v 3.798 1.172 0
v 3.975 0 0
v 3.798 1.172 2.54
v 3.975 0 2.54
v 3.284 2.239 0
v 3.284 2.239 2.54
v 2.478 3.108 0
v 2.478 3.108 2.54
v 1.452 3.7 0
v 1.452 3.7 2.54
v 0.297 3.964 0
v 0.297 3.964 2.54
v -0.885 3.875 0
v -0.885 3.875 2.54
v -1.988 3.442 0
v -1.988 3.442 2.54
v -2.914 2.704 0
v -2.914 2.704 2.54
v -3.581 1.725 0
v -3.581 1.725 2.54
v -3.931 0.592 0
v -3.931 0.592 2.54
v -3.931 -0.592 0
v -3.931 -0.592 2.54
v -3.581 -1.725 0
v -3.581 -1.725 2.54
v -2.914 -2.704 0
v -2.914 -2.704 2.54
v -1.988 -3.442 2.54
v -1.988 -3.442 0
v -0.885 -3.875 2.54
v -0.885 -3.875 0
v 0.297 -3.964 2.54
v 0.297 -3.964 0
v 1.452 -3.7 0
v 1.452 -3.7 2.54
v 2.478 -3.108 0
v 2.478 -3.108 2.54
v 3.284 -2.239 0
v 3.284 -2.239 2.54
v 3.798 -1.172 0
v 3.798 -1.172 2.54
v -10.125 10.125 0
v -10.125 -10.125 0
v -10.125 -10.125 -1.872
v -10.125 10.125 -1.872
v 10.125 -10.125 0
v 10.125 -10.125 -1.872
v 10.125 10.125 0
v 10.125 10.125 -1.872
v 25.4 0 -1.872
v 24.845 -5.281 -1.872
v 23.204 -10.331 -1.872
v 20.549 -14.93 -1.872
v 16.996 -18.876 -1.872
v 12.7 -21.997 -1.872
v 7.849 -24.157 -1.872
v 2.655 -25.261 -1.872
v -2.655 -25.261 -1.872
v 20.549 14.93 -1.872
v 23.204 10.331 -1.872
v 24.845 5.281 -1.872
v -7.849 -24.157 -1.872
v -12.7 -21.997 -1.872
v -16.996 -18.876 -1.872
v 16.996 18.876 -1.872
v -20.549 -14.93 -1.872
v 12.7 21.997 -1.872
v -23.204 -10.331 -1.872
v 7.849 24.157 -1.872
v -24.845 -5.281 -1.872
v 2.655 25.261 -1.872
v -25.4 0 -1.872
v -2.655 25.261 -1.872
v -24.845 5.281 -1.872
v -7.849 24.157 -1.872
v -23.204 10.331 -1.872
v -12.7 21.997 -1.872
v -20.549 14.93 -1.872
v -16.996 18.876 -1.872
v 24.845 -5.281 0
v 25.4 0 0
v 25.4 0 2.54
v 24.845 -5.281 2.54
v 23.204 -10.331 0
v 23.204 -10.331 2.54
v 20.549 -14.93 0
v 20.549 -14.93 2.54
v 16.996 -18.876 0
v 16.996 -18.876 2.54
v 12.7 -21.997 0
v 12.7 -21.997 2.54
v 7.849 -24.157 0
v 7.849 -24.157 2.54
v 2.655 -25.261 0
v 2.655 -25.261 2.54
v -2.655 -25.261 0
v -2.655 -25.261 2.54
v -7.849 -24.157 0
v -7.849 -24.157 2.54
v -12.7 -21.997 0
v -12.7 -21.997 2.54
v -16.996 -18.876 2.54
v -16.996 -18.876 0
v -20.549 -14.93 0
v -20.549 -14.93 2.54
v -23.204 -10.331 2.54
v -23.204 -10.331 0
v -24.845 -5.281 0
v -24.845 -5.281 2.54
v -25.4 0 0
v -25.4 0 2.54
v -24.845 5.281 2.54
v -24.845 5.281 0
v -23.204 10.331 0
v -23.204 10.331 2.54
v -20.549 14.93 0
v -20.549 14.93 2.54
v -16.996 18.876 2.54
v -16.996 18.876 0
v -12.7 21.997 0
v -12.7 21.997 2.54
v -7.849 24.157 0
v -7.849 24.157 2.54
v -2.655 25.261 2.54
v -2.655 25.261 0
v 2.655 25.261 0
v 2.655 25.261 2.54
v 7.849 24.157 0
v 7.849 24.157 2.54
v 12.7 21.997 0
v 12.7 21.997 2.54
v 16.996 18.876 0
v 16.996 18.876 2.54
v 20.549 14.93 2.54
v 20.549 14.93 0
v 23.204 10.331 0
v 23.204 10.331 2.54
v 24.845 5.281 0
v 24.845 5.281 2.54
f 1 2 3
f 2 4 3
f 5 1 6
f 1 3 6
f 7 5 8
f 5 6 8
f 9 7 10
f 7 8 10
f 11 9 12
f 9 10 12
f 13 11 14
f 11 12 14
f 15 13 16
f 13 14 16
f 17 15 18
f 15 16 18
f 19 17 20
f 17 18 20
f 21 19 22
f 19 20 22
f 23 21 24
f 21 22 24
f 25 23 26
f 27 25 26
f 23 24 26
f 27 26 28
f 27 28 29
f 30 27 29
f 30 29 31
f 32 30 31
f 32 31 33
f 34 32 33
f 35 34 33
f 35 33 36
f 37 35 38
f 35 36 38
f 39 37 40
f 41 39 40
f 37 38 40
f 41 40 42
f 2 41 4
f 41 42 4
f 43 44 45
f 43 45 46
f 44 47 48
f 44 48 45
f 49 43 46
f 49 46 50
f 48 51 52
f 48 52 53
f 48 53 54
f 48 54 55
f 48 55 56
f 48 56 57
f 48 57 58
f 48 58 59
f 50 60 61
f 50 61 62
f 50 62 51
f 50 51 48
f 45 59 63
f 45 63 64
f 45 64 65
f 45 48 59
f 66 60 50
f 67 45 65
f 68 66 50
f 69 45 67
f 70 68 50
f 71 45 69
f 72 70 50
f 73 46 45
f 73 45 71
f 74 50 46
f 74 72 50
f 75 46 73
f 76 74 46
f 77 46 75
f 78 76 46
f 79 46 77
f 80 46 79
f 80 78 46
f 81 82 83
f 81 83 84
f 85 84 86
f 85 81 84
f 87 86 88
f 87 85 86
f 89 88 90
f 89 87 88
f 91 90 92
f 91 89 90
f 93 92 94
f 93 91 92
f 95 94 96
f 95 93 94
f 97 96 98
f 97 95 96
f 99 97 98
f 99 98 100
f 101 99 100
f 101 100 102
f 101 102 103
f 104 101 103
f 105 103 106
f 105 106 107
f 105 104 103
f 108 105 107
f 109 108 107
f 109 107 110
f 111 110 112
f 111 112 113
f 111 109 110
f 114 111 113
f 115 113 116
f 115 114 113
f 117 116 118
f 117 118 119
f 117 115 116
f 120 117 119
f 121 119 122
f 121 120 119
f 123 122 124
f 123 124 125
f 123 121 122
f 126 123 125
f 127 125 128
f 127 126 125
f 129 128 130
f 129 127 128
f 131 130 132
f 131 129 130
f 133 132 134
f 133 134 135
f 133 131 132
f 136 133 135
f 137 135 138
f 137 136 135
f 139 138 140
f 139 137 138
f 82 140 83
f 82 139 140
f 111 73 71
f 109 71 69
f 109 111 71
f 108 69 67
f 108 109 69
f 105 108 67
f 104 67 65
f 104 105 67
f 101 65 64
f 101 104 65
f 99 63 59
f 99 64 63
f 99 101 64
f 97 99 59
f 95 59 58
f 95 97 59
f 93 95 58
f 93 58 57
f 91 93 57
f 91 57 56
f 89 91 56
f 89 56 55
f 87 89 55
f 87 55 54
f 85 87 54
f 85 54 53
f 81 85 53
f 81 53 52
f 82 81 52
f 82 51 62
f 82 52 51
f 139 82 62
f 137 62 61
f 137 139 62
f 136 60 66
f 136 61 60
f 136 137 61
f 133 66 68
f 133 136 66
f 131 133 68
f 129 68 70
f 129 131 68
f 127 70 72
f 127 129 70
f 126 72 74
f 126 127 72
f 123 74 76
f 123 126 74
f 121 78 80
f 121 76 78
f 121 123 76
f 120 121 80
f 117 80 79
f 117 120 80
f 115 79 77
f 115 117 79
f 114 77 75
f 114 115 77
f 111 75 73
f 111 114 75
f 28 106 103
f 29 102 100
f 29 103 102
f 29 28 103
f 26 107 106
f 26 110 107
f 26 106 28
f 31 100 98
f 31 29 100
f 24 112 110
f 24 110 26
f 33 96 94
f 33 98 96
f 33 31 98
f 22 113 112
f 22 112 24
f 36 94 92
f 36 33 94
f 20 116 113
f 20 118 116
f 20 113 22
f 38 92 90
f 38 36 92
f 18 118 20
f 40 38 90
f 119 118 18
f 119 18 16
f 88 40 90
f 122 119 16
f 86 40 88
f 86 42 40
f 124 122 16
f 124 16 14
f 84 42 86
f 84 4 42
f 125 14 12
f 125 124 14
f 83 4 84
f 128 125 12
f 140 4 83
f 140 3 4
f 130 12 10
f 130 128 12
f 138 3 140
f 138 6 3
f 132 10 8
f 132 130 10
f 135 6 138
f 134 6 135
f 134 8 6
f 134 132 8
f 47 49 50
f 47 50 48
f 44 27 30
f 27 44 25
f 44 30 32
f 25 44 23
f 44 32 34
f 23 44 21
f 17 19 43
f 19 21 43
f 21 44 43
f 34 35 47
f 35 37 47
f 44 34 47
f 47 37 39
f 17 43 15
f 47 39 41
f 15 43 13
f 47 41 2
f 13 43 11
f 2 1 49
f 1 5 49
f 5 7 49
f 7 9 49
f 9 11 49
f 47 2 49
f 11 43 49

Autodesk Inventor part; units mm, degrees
ref_plane "YZ Plane" through (0, 0, 0) normal (1, 0, 0) x (0, 1, 0)
ref_plane "XZ Plane" through (0, 0, 0) normal (0, 1, 0) x (-1, 0, 0)
sketch "Sketch1" plane through (0, 0, 0) normal (0, 0, 1) x (1, 0, 0)
  line L0 (-25.4, 25.4) -> (25.4, 25.4)
  line L1 (25.4, 25.4) -> (25.4, -25.4)
  line L2 (25.4, -25.4) -> (-25.4, -25.4)
  line L3 (-25.4, -25.4) -> (-25.4, 25.4)
  line L4 (-25.4, 25.4) -> (25.4, -25.4) construction
  line L5 (25.4, 25.4) -> (-25.4, -25.4) construction
  circle A0 centre (0, 0) radius 25.4
  dimension "d0" = 50.8
  dimension "d1" = 50.8
extrude "Extrusion1" add sketch "Sketch1" along normal blind 2.54 contours A0
sketch "Sketch2" plane through (0, 0, 2.54) normal (0, 0, 1) x (1, 0, 0)
  circle A0 centre (0, 0) radius 3.975 projected
extrude "Extrusion2" cut sketch "Sketch2" against normal blind 2.54
sketch "Sketch3" plane through (0, 0, 0) normal (0, 0, -1) x (-1, 0, 0)
  line L0 (-10, 10) -> (-10, -10) projected
  line L1 (10, 9.9) -> (10, -9.9) projected
  line L2 (7, -10) -> (-7, -10) projected
  line L3 (-7, 10) -> (7, 10) projected
  line L4 (-10.125, -10.125) -> (10.125, -10.125)
  line L5 (10.125, -10.125) -> (10.125, 10.125)
  line L6 (10.125, 10.125) -> (-10.125, 10.125)
  line L7 (-10.125, 10.125) -> (-10.125, -10.125)
  line L8 (-10.125, -10.125) -> (10.125, 10.125) construction
  line L9 (10.125, -10.125) -> (-10.125, 10.125) construction
  circle A0 centre (0, 0) radius 3.975 projected
  circle A1 centre (0, 0) radius 3.975 projected
  circle A2 centre (0, 0) radius 25.4 projected
  dimension "d6" = 20.25
  dimension "d7" = 20.25
ref_plane "Work Plane1" through (7, -9.9, -1.8716) normal (0, 0, -1) x (0, 1, 0)
extrude "Extrusion3" add sketch "Sketch3" along normal up to surface (1.8716 mm away) contours A2
properties part number "Base"
